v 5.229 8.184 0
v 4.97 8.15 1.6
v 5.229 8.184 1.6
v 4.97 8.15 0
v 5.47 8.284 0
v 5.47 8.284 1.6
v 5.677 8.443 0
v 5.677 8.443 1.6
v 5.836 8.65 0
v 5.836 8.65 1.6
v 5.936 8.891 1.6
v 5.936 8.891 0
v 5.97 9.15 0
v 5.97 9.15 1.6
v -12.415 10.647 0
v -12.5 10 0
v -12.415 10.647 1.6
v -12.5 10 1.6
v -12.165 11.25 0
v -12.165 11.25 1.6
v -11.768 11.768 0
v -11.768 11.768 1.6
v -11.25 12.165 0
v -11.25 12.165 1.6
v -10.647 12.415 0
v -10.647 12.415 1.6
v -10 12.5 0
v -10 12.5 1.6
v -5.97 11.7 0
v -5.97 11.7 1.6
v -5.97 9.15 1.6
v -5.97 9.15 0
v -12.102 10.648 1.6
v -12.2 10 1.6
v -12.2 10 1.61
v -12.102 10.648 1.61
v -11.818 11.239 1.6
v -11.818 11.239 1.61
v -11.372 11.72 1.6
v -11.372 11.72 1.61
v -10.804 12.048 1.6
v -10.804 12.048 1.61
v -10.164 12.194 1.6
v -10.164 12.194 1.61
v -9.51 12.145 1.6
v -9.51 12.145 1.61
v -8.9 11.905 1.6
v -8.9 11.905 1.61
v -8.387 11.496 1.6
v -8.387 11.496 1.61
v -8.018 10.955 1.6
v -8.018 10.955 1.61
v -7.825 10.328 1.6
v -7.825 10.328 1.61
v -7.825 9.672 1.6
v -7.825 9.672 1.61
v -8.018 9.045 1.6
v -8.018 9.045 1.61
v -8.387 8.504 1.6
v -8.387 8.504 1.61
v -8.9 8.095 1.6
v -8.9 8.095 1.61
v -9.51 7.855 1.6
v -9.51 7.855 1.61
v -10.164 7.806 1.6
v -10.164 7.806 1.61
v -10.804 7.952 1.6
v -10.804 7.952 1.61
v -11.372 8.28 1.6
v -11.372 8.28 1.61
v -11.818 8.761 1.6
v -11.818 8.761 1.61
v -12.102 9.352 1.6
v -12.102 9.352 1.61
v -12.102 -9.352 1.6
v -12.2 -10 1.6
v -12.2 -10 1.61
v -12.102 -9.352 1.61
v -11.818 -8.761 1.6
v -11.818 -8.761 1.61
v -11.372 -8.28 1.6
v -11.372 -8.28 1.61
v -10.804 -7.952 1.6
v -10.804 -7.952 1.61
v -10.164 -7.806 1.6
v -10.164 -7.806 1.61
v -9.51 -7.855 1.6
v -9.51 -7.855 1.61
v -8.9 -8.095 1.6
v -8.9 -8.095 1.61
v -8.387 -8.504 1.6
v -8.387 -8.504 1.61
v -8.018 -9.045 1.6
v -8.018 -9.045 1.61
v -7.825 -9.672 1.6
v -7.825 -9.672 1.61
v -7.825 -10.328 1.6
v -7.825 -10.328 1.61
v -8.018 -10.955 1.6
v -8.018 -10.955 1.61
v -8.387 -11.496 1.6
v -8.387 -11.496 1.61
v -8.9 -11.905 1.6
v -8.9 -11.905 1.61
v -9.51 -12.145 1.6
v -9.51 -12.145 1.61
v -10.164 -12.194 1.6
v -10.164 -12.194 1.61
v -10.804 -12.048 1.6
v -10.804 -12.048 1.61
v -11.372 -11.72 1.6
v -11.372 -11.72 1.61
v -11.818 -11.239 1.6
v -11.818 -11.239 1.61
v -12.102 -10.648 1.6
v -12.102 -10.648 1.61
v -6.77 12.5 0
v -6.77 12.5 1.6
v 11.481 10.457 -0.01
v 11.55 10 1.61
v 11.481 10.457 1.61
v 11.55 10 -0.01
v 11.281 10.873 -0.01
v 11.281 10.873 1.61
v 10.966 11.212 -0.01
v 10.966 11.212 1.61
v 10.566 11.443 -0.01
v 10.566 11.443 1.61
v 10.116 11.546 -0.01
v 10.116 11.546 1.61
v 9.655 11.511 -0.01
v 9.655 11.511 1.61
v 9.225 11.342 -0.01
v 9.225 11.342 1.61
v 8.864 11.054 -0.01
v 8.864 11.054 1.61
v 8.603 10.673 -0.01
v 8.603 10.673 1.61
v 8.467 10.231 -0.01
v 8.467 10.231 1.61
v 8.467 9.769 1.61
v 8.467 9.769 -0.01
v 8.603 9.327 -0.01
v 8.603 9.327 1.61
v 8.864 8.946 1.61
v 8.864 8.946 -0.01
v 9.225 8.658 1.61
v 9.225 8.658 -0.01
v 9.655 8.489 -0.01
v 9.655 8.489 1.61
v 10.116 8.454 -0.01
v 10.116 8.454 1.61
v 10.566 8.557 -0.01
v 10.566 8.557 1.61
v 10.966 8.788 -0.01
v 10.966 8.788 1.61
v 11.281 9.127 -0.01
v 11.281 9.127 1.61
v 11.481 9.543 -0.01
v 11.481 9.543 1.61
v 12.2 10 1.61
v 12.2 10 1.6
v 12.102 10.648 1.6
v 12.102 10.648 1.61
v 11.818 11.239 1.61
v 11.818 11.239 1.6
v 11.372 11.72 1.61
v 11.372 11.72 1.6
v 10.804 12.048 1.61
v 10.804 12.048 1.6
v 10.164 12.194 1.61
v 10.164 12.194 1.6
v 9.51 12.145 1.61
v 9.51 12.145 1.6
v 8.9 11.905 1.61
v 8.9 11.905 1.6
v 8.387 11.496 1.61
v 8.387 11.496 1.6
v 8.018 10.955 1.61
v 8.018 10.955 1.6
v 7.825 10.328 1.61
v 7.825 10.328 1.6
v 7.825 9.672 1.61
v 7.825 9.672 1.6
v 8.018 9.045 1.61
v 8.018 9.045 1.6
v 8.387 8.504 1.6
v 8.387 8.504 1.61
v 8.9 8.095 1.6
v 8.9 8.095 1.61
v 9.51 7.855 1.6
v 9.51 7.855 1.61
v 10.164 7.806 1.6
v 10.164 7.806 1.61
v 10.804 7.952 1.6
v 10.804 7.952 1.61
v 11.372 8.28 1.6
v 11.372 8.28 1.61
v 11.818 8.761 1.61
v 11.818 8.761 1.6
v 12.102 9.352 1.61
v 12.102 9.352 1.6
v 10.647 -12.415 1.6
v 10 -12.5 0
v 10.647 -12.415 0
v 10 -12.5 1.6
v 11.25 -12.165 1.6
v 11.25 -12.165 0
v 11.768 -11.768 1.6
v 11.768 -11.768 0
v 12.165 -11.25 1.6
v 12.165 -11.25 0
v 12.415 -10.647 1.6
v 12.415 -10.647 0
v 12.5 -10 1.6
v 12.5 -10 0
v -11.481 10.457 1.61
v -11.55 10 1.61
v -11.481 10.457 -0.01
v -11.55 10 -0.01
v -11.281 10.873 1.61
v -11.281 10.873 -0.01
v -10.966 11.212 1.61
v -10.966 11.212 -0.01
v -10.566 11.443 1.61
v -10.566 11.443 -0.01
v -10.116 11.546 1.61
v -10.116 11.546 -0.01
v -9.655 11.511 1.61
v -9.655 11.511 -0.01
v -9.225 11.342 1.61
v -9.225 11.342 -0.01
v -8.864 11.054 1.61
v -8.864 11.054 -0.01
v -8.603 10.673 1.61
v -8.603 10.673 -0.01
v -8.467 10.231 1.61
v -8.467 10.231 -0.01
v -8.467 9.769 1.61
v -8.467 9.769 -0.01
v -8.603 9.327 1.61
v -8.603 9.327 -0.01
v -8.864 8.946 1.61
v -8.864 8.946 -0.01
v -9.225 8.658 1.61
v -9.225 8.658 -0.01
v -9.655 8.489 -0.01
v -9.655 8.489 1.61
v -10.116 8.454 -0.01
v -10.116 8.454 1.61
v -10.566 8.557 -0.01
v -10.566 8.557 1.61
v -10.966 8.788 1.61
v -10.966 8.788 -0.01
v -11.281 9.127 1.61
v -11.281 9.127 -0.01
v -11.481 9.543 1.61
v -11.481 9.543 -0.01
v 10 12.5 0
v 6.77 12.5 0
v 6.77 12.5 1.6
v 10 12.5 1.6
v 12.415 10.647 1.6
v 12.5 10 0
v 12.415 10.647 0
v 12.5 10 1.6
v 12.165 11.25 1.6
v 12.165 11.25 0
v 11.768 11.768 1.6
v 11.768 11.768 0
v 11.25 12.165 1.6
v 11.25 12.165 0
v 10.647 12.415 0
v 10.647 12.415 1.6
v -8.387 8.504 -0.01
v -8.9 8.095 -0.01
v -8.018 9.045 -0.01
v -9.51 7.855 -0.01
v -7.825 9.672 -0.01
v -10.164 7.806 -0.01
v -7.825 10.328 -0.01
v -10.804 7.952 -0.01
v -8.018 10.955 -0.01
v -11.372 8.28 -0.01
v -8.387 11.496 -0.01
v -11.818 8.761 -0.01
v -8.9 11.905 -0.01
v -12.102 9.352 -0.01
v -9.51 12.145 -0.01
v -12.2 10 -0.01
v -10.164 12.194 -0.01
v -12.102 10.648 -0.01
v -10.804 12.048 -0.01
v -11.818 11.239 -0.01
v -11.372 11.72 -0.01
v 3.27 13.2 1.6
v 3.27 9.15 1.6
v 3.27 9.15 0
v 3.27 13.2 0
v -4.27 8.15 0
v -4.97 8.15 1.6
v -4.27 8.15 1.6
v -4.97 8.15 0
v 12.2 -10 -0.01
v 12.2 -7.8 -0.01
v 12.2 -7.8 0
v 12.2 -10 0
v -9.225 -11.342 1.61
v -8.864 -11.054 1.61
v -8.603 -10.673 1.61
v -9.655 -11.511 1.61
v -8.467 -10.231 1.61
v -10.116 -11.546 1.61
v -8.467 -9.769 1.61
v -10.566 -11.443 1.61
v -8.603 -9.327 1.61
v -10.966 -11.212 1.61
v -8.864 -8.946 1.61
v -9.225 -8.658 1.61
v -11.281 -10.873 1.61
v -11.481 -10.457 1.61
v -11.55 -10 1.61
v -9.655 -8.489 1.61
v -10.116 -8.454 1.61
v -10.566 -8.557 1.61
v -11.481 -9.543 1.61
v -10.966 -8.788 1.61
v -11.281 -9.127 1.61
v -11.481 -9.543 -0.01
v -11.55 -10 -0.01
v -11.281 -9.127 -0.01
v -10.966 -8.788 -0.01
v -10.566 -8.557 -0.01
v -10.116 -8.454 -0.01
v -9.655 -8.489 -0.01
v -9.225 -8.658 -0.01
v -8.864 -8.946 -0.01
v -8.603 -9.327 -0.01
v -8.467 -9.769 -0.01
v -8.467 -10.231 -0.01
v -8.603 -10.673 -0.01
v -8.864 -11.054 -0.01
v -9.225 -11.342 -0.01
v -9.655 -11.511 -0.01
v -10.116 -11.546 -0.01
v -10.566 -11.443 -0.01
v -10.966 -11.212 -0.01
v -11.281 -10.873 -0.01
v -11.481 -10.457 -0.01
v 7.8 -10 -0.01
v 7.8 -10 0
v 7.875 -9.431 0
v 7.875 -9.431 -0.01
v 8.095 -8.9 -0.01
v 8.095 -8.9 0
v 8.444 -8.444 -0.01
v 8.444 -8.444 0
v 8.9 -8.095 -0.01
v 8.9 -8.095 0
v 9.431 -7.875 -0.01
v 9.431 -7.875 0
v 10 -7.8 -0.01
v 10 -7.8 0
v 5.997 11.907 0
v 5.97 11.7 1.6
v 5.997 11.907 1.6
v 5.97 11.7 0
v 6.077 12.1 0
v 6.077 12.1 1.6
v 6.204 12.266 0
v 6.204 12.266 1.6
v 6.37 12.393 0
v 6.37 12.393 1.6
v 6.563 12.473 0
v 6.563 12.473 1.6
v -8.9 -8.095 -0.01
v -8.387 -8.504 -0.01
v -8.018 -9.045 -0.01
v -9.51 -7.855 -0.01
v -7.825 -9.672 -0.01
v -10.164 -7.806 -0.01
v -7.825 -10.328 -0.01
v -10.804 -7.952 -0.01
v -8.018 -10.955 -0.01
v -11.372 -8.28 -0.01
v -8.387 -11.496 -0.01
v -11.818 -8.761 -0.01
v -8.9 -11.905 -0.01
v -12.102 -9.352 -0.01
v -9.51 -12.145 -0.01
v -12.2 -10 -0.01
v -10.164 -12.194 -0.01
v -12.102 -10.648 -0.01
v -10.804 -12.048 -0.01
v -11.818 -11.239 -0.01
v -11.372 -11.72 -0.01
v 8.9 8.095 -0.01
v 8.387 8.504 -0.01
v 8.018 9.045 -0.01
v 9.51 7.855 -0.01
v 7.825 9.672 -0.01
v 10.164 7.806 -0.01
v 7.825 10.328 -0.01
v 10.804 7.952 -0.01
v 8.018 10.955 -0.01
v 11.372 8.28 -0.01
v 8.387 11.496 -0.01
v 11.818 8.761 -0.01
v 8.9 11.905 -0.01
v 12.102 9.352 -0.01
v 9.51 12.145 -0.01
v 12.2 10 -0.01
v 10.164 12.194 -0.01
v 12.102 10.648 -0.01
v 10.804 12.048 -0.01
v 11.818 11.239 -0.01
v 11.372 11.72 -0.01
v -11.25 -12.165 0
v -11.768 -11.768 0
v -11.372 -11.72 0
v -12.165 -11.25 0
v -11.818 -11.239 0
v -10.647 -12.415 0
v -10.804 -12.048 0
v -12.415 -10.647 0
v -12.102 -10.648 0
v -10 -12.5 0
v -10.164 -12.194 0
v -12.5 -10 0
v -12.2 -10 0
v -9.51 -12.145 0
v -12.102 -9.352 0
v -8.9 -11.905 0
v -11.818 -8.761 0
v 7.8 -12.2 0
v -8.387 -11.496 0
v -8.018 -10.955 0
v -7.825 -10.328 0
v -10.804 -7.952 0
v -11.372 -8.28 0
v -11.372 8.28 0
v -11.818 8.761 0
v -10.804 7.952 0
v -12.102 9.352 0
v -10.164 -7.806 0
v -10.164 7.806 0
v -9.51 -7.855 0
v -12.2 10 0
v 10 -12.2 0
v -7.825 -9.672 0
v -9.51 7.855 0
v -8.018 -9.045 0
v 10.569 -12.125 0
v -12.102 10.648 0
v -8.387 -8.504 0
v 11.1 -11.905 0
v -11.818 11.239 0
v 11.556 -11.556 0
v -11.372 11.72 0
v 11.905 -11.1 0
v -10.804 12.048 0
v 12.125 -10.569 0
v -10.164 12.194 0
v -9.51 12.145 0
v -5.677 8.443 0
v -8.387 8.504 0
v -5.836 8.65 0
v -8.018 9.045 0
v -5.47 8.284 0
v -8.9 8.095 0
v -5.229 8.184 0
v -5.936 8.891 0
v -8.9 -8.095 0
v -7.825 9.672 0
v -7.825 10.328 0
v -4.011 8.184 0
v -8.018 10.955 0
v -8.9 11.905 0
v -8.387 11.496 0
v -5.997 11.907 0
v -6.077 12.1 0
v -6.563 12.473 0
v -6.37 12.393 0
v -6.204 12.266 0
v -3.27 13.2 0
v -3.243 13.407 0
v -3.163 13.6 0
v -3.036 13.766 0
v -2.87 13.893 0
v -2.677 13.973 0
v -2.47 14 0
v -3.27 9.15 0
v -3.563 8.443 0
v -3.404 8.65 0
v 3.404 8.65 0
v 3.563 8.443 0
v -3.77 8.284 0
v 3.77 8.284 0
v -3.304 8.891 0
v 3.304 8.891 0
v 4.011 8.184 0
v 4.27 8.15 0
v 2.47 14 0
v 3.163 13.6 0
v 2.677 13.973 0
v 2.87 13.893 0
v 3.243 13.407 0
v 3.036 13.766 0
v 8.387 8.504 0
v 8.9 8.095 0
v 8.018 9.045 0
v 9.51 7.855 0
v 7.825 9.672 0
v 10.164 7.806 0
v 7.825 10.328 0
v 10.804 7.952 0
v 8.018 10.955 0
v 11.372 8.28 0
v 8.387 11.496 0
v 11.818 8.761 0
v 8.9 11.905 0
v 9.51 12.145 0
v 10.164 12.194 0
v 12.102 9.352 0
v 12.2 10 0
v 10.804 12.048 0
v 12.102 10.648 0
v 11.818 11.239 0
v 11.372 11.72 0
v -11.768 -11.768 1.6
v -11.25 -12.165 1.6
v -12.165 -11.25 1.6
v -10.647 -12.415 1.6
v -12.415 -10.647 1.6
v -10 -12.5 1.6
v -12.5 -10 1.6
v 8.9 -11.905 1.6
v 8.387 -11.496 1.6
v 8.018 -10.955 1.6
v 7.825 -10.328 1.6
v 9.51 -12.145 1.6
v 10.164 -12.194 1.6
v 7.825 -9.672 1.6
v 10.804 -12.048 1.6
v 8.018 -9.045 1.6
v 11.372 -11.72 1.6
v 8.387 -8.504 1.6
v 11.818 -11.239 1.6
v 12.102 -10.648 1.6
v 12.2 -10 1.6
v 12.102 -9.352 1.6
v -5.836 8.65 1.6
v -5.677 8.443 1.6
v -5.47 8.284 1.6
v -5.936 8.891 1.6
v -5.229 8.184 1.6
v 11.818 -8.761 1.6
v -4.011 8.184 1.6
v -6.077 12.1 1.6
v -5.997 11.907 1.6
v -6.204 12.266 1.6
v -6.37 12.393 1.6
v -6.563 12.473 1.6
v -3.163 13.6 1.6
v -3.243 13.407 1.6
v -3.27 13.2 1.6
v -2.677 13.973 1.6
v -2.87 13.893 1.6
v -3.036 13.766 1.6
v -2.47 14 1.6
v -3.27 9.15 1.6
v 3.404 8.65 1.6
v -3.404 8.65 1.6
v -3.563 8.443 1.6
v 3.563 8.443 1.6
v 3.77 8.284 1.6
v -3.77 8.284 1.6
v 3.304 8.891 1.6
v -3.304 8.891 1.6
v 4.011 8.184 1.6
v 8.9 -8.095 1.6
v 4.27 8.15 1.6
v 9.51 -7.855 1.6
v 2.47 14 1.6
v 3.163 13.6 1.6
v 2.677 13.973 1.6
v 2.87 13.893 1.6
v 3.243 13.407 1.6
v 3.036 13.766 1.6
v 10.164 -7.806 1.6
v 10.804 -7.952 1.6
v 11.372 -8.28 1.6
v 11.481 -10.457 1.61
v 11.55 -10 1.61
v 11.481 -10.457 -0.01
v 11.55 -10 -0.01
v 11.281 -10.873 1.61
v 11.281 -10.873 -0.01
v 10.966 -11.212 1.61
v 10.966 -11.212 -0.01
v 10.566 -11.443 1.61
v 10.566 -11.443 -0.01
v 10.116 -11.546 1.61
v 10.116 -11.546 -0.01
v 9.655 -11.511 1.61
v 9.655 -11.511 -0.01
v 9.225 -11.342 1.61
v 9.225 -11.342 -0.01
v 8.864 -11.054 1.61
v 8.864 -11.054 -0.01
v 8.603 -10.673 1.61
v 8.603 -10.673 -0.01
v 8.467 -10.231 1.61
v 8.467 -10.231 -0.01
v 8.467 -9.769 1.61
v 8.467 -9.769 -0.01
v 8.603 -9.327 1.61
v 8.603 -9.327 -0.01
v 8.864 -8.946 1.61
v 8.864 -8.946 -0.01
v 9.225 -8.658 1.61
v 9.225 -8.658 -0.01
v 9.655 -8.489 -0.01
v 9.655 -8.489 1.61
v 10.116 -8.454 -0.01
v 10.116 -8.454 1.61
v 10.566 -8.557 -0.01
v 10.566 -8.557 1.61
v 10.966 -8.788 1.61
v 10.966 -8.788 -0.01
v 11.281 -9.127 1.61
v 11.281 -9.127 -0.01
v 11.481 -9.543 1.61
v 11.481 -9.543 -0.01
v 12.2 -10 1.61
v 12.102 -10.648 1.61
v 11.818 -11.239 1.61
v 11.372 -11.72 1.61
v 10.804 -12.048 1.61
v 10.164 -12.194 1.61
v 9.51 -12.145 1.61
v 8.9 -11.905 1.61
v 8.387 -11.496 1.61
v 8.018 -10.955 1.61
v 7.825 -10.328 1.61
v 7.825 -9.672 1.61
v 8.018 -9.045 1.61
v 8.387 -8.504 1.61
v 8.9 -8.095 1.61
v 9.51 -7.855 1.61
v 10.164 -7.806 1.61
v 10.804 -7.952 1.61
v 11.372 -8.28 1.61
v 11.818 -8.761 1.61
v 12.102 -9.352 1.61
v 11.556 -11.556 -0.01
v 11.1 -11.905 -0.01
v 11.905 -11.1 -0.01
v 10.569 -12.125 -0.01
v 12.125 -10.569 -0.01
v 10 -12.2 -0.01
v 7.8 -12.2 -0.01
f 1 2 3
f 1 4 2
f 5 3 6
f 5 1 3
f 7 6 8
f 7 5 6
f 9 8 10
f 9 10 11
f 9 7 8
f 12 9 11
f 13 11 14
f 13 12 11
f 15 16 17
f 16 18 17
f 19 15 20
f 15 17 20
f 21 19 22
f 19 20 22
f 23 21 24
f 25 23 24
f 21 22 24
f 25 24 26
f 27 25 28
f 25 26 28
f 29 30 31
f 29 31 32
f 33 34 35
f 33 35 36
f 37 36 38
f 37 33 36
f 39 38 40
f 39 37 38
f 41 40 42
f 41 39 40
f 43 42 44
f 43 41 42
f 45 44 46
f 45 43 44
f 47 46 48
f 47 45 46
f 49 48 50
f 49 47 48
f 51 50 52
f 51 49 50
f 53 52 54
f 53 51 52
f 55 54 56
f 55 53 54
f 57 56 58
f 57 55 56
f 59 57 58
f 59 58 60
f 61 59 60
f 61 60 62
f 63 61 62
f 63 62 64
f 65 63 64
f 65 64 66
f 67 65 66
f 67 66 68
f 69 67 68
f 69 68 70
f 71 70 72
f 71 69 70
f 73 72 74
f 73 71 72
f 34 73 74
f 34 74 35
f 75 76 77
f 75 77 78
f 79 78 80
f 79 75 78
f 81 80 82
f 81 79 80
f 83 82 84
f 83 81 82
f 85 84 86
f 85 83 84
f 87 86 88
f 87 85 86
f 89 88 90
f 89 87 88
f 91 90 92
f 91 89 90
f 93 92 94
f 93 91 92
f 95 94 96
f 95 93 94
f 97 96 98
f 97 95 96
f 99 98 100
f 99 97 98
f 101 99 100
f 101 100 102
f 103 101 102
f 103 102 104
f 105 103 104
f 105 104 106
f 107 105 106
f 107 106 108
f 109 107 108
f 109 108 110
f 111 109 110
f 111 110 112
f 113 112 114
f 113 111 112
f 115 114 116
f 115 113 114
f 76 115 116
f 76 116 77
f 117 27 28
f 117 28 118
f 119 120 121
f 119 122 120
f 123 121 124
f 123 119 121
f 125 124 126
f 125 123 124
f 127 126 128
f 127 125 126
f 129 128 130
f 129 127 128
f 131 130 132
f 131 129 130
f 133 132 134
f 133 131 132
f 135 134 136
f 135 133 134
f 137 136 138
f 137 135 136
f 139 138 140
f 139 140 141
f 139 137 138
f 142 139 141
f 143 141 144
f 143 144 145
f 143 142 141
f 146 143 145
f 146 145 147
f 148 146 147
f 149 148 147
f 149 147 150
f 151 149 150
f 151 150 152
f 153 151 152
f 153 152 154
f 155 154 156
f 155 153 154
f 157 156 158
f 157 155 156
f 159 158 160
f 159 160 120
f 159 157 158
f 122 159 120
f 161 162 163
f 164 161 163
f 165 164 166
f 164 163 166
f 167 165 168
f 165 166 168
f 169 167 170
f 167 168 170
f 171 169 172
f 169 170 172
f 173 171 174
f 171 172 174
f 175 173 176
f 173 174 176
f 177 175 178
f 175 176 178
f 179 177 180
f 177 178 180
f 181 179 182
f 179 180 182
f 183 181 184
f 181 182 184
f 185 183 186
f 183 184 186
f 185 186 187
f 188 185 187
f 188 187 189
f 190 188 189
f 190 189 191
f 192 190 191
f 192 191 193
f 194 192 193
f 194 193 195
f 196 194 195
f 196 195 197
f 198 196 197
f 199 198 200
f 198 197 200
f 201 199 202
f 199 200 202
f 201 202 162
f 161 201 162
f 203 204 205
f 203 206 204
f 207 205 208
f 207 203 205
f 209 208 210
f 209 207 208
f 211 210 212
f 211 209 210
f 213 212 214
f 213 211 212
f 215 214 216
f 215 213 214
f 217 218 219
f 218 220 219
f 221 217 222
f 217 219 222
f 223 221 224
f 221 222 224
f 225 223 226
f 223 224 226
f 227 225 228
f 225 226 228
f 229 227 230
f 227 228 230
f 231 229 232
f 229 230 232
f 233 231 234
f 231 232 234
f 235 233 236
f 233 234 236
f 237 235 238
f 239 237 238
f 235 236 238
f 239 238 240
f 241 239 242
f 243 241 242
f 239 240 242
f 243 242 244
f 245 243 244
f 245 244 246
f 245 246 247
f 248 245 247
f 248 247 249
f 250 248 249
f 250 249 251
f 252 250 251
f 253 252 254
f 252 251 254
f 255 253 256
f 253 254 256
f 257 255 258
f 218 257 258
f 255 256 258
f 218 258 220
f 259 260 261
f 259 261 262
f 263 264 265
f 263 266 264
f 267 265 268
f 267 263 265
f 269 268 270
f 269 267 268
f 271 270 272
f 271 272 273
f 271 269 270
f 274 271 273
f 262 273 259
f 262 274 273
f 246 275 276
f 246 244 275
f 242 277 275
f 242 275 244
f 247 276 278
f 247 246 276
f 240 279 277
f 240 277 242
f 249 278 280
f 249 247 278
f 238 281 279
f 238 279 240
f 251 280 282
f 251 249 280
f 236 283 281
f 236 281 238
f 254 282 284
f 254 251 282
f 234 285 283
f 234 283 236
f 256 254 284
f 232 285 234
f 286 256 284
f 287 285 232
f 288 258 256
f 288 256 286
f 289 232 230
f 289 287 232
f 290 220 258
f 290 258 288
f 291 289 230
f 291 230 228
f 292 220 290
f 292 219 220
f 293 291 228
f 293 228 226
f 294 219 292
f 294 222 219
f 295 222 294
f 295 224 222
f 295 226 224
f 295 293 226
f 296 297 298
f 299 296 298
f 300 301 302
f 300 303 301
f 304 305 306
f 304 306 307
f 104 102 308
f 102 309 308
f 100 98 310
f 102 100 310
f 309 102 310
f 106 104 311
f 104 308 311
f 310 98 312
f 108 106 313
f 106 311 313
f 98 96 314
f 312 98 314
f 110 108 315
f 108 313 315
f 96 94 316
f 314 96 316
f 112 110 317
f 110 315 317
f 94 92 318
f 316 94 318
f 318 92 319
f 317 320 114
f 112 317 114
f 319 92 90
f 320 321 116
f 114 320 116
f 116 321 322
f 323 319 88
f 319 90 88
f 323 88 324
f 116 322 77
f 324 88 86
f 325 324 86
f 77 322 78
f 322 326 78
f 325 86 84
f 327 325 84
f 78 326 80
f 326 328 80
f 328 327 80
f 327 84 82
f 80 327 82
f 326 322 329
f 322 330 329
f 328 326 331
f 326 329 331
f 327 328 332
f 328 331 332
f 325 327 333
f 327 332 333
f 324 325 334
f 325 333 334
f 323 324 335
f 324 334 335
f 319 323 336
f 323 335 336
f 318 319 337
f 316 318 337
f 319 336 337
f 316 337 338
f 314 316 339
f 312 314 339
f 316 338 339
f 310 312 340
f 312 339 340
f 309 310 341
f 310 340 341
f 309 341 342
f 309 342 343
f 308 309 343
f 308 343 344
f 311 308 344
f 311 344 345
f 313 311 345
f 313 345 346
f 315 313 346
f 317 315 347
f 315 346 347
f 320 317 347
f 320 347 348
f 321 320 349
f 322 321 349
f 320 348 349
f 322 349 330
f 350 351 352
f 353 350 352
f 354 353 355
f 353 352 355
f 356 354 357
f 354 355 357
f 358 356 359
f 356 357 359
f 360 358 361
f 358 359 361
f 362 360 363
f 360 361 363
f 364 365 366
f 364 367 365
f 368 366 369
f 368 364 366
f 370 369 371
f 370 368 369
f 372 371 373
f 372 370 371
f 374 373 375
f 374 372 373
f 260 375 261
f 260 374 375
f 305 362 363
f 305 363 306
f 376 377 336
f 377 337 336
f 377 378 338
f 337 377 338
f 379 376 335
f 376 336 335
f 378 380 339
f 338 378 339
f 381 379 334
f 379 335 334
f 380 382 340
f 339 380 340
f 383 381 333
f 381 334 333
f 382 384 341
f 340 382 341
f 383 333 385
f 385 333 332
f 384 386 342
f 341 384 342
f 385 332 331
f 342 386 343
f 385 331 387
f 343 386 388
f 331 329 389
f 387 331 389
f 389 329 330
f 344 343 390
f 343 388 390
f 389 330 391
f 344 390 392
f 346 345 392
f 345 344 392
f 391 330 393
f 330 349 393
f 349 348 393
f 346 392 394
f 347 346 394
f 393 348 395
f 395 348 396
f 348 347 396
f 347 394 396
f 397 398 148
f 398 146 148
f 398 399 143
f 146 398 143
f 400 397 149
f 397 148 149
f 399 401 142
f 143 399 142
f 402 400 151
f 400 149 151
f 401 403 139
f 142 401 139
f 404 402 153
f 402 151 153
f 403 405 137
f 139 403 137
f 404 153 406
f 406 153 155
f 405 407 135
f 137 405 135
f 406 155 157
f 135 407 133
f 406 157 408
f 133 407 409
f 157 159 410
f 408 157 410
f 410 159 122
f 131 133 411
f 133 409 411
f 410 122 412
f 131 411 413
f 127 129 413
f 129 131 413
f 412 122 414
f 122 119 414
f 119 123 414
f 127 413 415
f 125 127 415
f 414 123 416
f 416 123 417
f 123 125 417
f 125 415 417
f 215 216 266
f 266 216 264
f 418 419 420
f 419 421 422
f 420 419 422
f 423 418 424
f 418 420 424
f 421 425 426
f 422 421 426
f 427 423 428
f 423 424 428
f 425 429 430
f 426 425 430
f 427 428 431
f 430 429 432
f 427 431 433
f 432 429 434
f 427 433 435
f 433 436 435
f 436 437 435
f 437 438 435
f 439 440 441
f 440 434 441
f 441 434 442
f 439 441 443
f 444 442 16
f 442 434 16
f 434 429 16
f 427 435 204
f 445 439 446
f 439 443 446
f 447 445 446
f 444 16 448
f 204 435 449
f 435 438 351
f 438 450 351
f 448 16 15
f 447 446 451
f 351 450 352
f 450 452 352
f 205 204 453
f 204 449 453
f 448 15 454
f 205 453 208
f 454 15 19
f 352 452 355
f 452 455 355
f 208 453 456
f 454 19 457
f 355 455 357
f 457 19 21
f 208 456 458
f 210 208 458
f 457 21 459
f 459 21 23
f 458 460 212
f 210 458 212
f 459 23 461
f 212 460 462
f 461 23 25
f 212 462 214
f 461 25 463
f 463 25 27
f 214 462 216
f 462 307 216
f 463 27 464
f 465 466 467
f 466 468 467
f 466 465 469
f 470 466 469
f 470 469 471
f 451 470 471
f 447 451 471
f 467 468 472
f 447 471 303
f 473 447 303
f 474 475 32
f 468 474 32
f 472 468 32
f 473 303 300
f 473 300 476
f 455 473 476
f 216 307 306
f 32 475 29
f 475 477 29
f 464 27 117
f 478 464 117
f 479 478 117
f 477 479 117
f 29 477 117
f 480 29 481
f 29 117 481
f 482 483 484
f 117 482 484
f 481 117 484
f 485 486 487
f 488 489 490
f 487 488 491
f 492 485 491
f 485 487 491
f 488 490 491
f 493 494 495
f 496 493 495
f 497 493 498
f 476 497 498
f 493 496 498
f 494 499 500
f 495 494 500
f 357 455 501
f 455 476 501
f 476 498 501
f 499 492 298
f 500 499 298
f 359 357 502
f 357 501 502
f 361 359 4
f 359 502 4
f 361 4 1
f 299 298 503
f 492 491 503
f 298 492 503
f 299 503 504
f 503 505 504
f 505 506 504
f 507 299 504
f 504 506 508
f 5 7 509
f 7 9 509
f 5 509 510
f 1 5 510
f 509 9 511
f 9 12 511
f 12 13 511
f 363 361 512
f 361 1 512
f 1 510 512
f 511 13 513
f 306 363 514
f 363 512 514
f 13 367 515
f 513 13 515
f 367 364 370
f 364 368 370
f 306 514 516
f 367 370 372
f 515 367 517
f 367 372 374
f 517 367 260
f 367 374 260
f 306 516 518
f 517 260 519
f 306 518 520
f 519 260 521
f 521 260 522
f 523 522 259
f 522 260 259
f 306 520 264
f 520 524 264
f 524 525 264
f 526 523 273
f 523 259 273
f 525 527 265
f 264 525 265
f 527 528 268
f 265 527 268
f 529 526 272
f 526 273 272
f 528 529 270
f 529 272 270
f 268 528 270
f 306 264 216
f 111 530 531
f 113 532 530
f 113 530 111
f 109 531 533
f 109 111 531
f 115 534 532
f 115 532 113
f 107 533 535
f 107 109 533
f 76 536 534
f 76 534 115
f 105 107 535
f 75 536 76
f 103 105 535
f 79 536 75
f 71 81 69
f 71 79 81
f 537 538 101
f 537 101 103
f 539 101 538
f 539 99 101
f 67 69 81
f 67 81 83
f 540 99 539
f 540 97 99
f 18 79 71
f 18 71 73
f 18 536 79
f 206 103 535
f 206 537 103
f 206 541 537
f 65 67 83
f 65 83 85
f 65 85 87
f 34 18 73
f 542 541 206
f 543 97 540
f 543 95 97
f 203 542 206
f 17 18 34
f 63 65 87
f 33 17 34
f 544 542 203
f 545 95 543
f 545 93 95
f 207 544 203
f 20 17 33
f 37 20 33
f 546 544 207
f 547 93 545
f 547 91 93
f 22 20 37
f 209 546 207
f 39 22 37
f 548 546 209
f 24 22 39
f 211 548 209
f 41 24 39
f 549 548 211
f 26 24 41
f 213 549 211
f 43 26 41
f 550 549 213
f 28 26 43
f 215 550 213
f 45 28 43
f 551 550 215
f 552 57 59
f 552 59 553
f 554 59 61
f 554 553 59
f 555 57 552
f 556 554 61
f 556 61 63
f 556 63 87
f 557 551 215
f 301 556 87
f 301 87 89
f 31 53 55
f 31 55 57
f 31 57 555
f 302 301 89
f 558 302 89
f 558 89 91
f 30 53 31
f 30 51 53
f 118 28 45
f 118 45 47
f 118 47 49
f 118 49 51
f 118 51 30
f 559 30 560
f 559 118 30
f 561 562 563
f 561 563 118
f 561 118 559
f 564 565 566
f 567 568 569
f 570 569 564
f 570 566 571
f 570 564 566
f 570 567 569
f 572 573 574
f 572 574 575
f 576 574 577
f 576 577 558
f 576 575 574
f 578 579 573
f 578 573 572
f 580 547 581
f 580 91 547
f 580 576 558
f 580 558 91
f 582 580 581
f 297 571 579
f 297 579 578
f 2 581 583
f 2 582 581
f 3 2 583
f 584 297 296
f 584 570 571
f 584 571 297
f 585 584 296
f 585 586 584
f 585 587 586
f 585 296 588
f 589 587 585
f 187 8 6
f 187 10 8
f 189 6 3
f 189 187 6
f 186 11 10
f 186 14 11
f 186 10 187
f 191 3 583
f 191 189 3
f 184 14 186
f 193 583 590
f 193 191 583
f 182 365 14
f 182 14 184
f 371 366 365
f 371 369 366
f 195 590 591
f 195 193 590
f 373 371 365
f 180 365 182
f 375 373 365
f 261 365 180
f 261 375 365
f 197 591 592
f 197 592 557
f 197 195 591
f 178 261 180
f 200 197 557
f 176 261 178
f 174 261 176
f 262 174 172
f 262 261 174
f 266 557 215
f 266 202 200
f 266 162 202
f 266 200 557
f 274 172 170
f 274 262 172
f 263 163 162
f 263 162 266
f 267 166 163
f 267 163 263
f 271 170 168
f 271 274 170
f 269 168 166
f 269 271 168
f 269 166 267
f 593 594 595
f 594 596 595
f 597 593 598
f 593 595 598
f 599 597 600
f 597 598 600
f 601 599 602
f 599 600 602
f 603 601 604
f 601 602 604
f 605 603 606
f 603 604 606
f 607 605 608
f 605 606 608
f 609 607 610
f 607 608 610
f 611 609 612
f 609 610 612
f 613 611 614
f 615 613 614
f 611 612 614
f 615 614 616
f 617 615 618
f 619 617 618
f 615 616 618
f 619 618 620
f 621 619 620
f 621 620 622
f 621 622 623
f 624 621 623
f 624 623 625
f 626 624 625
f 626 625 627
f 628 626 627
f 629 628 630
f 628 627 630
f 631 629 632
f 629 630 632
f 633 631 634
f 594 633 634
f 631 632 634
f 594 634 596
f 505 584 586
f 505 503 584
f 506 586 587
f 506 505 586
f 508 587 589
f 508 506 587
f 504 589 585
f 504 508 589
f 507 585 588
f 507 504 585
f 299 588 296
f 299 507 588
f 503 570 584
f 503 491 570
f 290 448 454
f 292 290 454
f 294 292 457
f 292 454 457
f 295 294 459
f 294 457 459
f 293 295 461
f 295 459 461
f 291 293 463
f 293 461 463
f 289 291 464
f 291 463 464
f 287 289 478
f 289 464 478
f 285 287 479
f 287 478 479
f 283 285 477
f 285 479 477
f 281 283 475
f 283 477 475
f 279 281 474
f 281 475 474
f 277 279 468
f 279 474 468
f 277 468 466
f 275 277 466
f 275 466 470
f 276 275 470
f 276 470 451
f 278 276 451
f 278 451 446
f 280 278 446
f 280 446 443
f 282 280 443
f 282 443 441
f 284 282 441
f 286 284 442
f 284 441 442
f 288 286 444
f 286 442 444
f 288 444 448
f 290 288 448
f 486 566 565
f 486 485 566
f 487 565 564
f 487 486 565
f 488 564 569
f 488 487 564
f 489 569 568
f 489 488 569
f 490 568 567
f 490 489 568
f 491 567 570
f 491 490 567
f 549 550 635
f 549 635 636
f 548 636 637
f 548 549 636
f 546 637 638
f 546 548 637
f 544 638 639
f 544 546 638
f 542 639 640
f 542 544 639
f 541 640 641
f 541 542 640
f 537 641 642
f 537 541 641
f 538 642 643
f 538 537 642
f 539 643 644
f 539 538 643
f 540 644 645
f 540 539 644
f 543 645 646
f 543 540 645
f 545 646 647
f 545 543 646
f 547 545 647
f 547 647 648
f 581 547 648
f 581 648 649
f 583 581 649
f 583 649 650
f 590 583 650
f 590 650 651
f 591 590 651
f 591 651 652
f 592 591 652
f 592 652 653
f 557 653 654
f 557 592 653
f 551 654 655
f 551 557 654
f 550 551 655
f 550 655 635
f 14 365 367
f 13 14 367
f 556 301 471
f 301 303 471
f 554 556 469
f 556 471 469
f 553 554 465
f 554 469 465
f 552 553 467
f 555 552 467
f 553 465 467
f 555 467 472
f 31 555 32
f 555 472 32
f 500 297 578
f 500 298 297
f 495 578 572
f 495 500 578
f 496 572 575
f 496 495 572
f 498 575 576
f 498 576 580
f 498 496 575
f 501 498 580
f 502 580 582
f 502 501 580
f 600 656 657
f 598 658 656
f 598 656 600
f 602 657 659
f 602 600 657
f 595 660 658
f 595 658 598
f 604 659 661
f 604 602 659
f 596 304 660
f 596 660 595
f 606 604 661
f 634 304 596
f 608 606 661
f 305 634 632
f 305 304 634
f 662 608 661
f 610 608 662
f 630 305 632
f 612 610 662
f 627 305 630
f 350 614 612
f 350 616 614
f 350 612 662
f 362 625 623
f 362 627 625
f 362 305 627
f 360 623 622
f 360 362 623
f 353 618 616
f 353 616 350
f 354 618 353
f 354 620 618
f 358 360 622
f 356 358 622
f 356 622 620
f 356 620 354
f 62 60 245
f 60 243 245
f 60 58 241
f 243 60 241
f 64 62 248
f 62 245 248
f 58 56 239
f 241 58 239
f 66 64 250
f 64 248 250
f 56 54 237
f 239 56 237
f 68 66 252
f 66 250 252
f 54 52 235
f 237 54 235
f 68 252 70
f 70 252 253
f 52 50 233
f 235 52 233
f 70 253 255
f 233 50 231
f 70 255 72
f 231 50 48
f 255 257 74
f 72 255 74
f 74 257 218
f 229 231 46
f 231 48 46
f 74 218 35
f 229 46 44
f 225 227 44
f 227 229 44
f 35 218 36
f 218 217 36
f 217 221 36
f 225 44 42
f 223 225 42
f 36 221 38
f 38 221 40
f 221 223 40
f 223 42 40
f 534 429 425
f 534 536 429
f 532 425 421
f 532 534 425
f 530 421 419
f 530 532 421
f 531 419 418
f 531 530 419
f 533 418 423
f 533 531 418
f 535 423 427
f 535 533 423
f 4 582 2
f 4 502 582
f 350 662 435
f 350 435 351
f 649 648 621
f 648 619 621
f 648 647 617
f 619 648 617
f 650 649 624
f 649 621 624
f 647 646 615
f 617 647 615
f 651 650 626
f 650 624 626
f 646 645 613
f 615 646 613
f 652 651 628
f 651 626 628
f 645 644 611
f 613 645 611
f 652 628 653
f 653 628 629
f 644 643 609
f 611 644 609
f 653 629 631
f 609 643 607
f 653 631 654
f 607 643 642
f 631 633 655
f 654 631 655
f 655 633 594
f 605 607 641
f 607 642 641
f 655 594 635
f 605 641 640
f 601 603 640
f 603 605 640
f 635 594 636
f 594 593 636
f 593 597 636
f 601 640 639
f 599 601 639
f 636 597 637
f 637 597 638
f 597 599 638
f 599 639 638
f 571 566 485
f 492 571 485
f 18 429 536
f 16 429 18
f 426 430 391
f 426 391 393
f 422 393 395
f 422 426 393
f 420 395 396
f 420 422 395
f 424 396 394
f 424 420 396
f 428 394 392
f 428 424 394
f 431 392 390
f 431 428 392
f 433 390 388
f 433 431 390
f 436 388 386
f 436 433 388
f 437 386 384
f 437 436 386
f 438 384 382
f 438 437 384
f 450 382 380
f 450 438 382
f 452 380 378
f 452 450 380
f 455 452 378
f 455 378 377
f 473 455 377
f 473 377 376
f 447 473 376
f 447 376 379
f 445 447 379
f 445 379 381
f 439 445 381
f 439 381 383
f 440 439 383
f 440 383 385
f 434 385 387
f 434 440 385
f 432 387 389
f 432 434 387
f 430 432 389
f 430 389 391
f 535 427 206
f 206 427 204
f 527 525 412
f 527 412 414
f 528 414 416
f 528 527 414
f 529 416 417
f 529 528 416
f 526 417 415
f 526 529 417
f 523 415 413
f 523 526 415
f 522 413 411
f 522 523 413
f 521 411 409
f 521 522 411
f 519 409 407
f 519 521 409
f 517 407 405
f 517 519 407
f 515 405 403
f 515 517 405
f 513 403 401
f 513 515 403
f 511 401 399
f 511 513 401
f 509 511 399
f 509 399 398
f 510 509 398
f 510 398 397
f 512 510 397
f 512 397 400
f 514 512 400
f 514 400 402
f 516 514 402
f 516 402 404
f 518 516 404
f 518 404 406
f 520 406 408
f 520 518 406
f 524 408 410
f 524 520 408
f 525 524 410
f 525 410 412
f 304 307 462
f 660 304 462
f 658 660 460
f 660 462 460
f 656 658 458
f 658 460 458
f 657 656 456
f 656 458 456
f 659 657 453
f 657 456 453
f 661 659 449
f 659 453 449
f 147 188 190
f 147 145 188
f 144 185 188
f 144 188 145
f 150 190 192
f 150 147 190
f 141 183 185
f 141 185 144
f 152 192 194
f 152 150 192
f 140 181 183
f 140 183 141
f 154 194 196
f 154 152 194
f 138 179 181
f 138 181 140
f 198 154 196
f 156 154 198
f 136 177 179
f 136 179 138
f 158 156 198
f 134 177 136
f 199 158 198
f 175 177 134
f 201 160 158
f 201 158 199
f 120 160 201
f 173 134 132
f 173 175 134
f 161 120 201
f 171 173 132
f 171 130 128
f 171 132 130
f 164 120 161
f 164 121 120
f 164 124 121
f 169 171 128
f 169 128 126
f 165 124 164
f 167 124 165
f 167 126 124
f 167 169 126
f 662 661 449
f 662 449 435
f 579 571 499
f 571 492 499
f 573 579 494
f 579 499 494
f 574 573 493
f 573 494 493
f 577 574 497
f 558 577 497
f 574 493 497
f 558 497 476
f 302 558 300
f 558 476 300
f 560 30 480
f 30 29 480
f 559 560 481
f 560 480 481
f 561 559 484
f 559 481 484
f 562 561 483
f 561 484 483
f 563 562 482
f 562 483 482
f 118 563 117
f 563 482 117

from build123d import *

# Parameters (mm, degrees)
SKETCH2_W                                  = 25
SKETCH2_H                                  = 25
BOSS_EXTRUDE1_MODULE_PCB_DEPTH             = 1.6
FILLET1_CORNERS_R                          = 2.5
SKETCH3_R                                  = 1.55
CUT_EXTRUDE1_FIRST_MH_DEPTH                = 1.6
SKETCH4_R                                  = 2.2
SKETCH4_R_2                                = 1.55
BOSS_EXTRUDE2_PTH_FOR_FIRST_MH_DEPTH       = 0.01
MIRROR2_SECOND_MH_PTH_COPY_1_SKETCH_R      = 2.2
MIRROR2_SECOND_MH_PTH_COPY_1_SKETCH_R_2    = 1.55
MIRROR2_SECOND_MH_PTH_COPY_1_DEPTH         = 0.01
MIRROR3_REMAINING_MH_PTH_COPY_1_SKETC_R    = 1.55
MIRROR3_REMAINING_MH_PTH_COPY_1_DEPTH      = 1.6
MIRROR3_REMAINING_MH_PTH_COPY_2_SKETC_R    = 2.2
MIRROR3_REMAINING_MH_PTH_COPY_2_SKETC_R_2  = 1.55
MIRROR3_REMAINING_MH_PTH_COPY_2_DEPTH      = 0.01
MIRROR3_REMAINING_MH_PTH_COPY_3_SKETC_R    = 2.2
MIRROR3_REMAINING_MH_PTH_COPY_3_SKETC_R_2  = 1.55
MIRROR3_REMAINING_MH_PTH_COPY_3_DEPTH      = 0.01
MIRROR3_REMAINING_MH_PTH_COPY_4_SKETC_R    = 2.2
MIRROR3_REMAINING_MH_PTH_COPY_4_SKETC_R_2  = 1.55
MIRROR3_REMAINING_MH_PTH_COPY_4_DEPTH      = 0.01
BOSS_EXTRUDE1_REACH                        = 3.62
SKETCH5_W                                  = 6.54
SKETCH5_H                                  = 1.6
BOSS_EXTRUDE3_TIP_OF_EDGE_CONNECTOR_DEPTH  = 1.5
SKETCH6_W                                  = 2.7
SKETCH6_H                                  = 1.6
CUT_EXTRUDE2_SIDES_OF_EDGE_CONNECTOR_DEPTH = 4.35
FILLET2_TIP_OF_EDGE_CONNECTOR_R            = 0.8
FILLET3_BASE_OF_EDGE_CONNECTOR_R           = 1
FILLET4_ADJACENT_TO_EDGE_CONNECTOR_R       = 0.8


with BuildPart() as part:
    # Sketch2 → Boss-Extrude1 _module PCB (new body)
    with BuildSketch(Plane.XY):
        Rectangle(SKETCH2_W, SKETCH2_H)
    extrude(amount=BOSS_EXTRUDE1_MODULE_PCB_DEPTH)

    # Fillet1 _corners
    fillet1_corners_edges = [part.edges().sort_by_distance(p)[0] for p in [
        (12.5, -12.5, 0.8),
        (-12.5, -12.5, 0.8),
        (-12.5, 12.5, 0.8),
        (12.5, 12.5, 0.8),
    ]]
    fillet(fillet1_corners_edges, radius=FILLET1_CORNERS_R)

    # Sketch3 → Cut-Extrude1 _first MH (cut)
    with BuildSketch(Plane.XY):
        with Locations((10, 10)):
            Circle(SKETCH3_R)
    cut_extrude1_first_mh = extrude(amount=CUT_EXTRUDE1_FIRST_MH_DEPTH, mode=Mode.SUBTRACT)

    # Sketch4 → Boss-Extrude2 _PTH for first MH (add)
    with BuildSketch(Plane.XY):
        with Locations((10, 10)):
            Circle(SKETCH4_R)
        with Locations((10, 10)):
            Circle(SKETCH4_R_2, mode=Mode.SUBTRACT)
    boss_extrude2_pth_for_first_mh = extrude(amount=-BOSS_EXTRUDE2_PTH_FOR_FIRST_MH_DEPTH)

    # Mirror1 _PTH for first MH: Boss-Extrude2 _PTH for first MH across plane
    add(boss_extrude2_pth_for_first_mh.mirror(Plane.XY.offset(0.8)))

    # Mirror2 _second MH _ PTH: Cut-Extrude1 _first MH, Boss-Extrude2 _PTH for first MH across plane
    add(cut_extrude1_first_mh.mirror(Plane(origin=(0, 0, 0), x_dir=(0, 0, 1), z_dir=(1, 0, 0))), mode=Mode.SUBTRACT)
    add(boss_extrude2_pth_for_first_mh.mirror(Plane(origin=(0, 0, 0), x_dir=(0, 0, 1), z_dir=(1, 0, 0))))

    # Mirror2 _second MH _ PTH copy 1 sketch → Mirror2 _second MH _ PTH copy 1 (add)
    with BuildSketch(Plane(origin=(0, 0, 1.6), x_dir=(-1, 0, 0), z_dir=(0, 0, -1))):
        with Locations((10, 10)):
            Circle(MIRROR2_SECOND_MH_PTH_COPY_1_SKETCH_R)
        with Locations((10, 10)):
            Circle(MIRROR2_SECOND_MH_PTH_COPY_1_SKETCH_R_2, mode=Mode.SUBTRACT)
    extrude(amount=-MIRROR2_SECOND_MH_PTH_COPY_1_DEPTH)

    # Mirror3 _remaining MH _ PTH: Cut-Extrude1 _first MH, Boss-Extrude2 _PTH for first MH across plane
    add(cut_extrude1_first_mh.mirror(Plane.ZX), mode=Mode.SUBTRACT)
    add(boss_extrude2_pth_for_first_mh.mirror(Plane.ZX))

    # Mirror3 _remaining MH _ PTH copy 1 sketc → Mirror3 _remaining MH _ PTH copy 1 (cut)
    with BuildSketch(Plane(origin=(0, 0, 0), x_dir=(-1, 0, 0), z_dir=(0, 0, 1))):
        with Locations((10, 10)):
            Circle(MIRROR3_REMAINING_MH_PTH_COPY_1_SKETC_R)
    extrude(amount=MIRROR3_REMAINING_MH_PTH_COPY_1_DEPTH, mode=Mode.SUBTRACT)

    # Mirror3 _remaining MH _ PTH copy 2 sketc → Mirror3 _remaining MH _ PTH copy 2 (add)
    with BuildSketch(Plane(origin=(0, 0, 0), x_dir=(-1, 0, 0), z_dir=(0, 0, 1))):
        with Locations((10, 10)):
            Circle(MIRROR3_REMAINING_MH_PTH_COPY_2_SKETC_R)
        with Locations((10, 10)):
            Circle(MIRROR3_REMAINING_MH_PTH_COPY_2_SKETC_R_2, mode=Mode.SUBTRACT)
    extrude(amount=-MIRROR3_REMAINING_MH_PTH_COPY_2_DEPTH)

    # Mirror3 _remaining MH _ PTH copy 3 sketc → Mirror3 _remaining MH _ PTH copy 3 (add)
    with BuildSketch(Plane(origin=(0, 0, 1.6), x_dir=(-1, 0, 0), z_dir=(0, 0, -1))):
        with Locations((10, -10)):
            Circle(MIRROR3_REMAINING_MH_PTH_COPY_3_SKETC_R)
        with Locations((10, -10)):
            Circle(MIRROR3_REMAINING_MH_PTH_COPY_3_SKETC_R_2, mode=Mode.SUBTRACT)
    extrude(amount=-MIRROR3_REMAINING_MH_PTH_COPY_3_DEPTH)

    # Mirror3 _remaining MH _ PTH copy 4 sketc → Mirror3 _remaining MH _ PTH copy 4 (add)
    with BuildSketch(Plane(origin=(0, 0, 1.6), x_dir=(1, 0, 0), z_dir=(0, 0, -1))):
        with Locations((10, 10)):
            Circle(MIRROR3_REMAINING_MH_PTH_COPY_4_SKETC_R)
        with Locations((10, 10)):
            Circle(MIRROR3_REMAINING_MH_PTH_COPY_4_SKETC_R_2, mode=Mode.SUBTRACT)
    extrude(amount=-MIRROR3_REMAINING_MH_PTH_COPY_4_DEPTH)

    # Sketch7 → Boss-Extrude1 (add, up to next)
    with BuildSketch(Plane(origin=(0, 0, -0.01), x_dir=(-1, 0, 0), z_dir=(0, 0, -1)), mode=Mode.PRIVATE) as boss_extrude1_sk1:
        with BuildLine():
            Line((-10, -7.8), (-12.2, -7.8))
            Line((-12.2, -7.8), (-12.2, -10))
            ThreePointArc((-12.2, -10), (-11.555634919, -8.444365081), (-10, -7.8))
        make_face()
    boss_extrude1_tool1 = extrude(boss_extrude1_sk1.sketch, amount=-BOSS_EXTRUDE1_REACH, mode=Mode.PRIVATE) - part.part
    add(boss_extrude1_tool1.solids().sort_by_distance((11.708591, -8.291409, -0.01))[0])
    # Sketch7 → Boss-Extrude1 (add, up to next)
    with BuildSketch(Plane(origin=(0, 0, -0.01), x_dir=(-1, 0, 0), z_dir=(0, 0, -1)), mode=Mode.PRIVATE) as boss_extrude1_sk2:
        with BuildLine():
            Line((-10, -12.2), (-7.8, -12.2))
            Line((-7.8, -12.2), (-7.8, -10))
            ThreePointArc((-7.8, -10), (-8.444365081, -11.555634919), (-10, -12.2))
        make_face()
    boss_extrude1_tool2 = extrude(boss_extrude1_sk2.sketch, amount=-BOSS_EXTRUDE1_REACH, mode=Mode.PRIVATE) - part.part
    add(boss_extrude1_tool2.solids().sort_by_distance((8.291409, -11.708591, -0.01))[0])

    # Sketch5 → Boss-Extrude3 _tip of edge connector (add)
    with BuildSketch(Plane(origin=(0, 12.5, 0), x_dir=(1, 0, 0), z_dir=(0, 1, 0))):
        with Locations((0, -0.8)):
            Rectangle(SKETCH5_W, SKETCH5_H)
    extrude(amount=BOSS_EXTRUDE3_TIP_OF_EDGE_CONNECTOR_DEPTH)

    # Sketch6 → Cut-Extrude2 _sides of edge connector (cut)
    with BuildSketch(Plane(origin=(0, 12.5, 0), x_dir=(1, 0, 0), z_dir=(0, 1, 0))):
        with Locations((-4.62, -0.8)):
            Rectangle(SKETCH6_W, SKETCH6_H)
        with Locations((4.62, -0.8)):
            Rectangle(SKETCH6_W, SKETCH6_H)
    extrude(amount=-CUT_EXTRUDE2_SIDES_OF_EDGE_CONNECTOR_DEPTH, mode=Mode.SUBTRACT)

    # Fillet2 _tip of edge connector
    fillet2_tip_of_edge_connector_edges = [part.edges().sort_by_distance(p)[0] for p in [
        (3.27, 14, 0.8),
        (-3.27, 14, 0.8),
    ]]
    fillet(fillet2_tip_of_edge_connector_edges, radius=FILLET2_TIP_OF_EDGE_CONNECTOR_R)

    # Fillet3 _base of edge connector
    fillet3_base_of_edge_connector_edges = [part.edges().sort_by_distance(p)[0] for p in [
        (-3.27, 8.15, 0.8),
        (-5.97, 8.15, 0.8),
        (3.27, 8.15, 0.8),
        (5.97, 8.15, 0.8),
    ]]
    fillet(fillet3_base_of_edge_connector_edges, radius=FILLET3_BASE_OF_EDGE_CONNECTOR_R)

    # Fillet4 _adjacent to edge connector
    fillet4_adjacent_to_edge_connector_edges = [part.edges().sort_by_distance(p)[0] for p in [
        (-5.97, 12.5, 0.8),
        (5.97, 12.5, 0.8),
    ]]
    fillet(fillet4_adjacent_to_edge_connector_edges, radius=FILLET4_ADJACENT_TO_EDGE_CONNECTOR_R)


solid = part.part
